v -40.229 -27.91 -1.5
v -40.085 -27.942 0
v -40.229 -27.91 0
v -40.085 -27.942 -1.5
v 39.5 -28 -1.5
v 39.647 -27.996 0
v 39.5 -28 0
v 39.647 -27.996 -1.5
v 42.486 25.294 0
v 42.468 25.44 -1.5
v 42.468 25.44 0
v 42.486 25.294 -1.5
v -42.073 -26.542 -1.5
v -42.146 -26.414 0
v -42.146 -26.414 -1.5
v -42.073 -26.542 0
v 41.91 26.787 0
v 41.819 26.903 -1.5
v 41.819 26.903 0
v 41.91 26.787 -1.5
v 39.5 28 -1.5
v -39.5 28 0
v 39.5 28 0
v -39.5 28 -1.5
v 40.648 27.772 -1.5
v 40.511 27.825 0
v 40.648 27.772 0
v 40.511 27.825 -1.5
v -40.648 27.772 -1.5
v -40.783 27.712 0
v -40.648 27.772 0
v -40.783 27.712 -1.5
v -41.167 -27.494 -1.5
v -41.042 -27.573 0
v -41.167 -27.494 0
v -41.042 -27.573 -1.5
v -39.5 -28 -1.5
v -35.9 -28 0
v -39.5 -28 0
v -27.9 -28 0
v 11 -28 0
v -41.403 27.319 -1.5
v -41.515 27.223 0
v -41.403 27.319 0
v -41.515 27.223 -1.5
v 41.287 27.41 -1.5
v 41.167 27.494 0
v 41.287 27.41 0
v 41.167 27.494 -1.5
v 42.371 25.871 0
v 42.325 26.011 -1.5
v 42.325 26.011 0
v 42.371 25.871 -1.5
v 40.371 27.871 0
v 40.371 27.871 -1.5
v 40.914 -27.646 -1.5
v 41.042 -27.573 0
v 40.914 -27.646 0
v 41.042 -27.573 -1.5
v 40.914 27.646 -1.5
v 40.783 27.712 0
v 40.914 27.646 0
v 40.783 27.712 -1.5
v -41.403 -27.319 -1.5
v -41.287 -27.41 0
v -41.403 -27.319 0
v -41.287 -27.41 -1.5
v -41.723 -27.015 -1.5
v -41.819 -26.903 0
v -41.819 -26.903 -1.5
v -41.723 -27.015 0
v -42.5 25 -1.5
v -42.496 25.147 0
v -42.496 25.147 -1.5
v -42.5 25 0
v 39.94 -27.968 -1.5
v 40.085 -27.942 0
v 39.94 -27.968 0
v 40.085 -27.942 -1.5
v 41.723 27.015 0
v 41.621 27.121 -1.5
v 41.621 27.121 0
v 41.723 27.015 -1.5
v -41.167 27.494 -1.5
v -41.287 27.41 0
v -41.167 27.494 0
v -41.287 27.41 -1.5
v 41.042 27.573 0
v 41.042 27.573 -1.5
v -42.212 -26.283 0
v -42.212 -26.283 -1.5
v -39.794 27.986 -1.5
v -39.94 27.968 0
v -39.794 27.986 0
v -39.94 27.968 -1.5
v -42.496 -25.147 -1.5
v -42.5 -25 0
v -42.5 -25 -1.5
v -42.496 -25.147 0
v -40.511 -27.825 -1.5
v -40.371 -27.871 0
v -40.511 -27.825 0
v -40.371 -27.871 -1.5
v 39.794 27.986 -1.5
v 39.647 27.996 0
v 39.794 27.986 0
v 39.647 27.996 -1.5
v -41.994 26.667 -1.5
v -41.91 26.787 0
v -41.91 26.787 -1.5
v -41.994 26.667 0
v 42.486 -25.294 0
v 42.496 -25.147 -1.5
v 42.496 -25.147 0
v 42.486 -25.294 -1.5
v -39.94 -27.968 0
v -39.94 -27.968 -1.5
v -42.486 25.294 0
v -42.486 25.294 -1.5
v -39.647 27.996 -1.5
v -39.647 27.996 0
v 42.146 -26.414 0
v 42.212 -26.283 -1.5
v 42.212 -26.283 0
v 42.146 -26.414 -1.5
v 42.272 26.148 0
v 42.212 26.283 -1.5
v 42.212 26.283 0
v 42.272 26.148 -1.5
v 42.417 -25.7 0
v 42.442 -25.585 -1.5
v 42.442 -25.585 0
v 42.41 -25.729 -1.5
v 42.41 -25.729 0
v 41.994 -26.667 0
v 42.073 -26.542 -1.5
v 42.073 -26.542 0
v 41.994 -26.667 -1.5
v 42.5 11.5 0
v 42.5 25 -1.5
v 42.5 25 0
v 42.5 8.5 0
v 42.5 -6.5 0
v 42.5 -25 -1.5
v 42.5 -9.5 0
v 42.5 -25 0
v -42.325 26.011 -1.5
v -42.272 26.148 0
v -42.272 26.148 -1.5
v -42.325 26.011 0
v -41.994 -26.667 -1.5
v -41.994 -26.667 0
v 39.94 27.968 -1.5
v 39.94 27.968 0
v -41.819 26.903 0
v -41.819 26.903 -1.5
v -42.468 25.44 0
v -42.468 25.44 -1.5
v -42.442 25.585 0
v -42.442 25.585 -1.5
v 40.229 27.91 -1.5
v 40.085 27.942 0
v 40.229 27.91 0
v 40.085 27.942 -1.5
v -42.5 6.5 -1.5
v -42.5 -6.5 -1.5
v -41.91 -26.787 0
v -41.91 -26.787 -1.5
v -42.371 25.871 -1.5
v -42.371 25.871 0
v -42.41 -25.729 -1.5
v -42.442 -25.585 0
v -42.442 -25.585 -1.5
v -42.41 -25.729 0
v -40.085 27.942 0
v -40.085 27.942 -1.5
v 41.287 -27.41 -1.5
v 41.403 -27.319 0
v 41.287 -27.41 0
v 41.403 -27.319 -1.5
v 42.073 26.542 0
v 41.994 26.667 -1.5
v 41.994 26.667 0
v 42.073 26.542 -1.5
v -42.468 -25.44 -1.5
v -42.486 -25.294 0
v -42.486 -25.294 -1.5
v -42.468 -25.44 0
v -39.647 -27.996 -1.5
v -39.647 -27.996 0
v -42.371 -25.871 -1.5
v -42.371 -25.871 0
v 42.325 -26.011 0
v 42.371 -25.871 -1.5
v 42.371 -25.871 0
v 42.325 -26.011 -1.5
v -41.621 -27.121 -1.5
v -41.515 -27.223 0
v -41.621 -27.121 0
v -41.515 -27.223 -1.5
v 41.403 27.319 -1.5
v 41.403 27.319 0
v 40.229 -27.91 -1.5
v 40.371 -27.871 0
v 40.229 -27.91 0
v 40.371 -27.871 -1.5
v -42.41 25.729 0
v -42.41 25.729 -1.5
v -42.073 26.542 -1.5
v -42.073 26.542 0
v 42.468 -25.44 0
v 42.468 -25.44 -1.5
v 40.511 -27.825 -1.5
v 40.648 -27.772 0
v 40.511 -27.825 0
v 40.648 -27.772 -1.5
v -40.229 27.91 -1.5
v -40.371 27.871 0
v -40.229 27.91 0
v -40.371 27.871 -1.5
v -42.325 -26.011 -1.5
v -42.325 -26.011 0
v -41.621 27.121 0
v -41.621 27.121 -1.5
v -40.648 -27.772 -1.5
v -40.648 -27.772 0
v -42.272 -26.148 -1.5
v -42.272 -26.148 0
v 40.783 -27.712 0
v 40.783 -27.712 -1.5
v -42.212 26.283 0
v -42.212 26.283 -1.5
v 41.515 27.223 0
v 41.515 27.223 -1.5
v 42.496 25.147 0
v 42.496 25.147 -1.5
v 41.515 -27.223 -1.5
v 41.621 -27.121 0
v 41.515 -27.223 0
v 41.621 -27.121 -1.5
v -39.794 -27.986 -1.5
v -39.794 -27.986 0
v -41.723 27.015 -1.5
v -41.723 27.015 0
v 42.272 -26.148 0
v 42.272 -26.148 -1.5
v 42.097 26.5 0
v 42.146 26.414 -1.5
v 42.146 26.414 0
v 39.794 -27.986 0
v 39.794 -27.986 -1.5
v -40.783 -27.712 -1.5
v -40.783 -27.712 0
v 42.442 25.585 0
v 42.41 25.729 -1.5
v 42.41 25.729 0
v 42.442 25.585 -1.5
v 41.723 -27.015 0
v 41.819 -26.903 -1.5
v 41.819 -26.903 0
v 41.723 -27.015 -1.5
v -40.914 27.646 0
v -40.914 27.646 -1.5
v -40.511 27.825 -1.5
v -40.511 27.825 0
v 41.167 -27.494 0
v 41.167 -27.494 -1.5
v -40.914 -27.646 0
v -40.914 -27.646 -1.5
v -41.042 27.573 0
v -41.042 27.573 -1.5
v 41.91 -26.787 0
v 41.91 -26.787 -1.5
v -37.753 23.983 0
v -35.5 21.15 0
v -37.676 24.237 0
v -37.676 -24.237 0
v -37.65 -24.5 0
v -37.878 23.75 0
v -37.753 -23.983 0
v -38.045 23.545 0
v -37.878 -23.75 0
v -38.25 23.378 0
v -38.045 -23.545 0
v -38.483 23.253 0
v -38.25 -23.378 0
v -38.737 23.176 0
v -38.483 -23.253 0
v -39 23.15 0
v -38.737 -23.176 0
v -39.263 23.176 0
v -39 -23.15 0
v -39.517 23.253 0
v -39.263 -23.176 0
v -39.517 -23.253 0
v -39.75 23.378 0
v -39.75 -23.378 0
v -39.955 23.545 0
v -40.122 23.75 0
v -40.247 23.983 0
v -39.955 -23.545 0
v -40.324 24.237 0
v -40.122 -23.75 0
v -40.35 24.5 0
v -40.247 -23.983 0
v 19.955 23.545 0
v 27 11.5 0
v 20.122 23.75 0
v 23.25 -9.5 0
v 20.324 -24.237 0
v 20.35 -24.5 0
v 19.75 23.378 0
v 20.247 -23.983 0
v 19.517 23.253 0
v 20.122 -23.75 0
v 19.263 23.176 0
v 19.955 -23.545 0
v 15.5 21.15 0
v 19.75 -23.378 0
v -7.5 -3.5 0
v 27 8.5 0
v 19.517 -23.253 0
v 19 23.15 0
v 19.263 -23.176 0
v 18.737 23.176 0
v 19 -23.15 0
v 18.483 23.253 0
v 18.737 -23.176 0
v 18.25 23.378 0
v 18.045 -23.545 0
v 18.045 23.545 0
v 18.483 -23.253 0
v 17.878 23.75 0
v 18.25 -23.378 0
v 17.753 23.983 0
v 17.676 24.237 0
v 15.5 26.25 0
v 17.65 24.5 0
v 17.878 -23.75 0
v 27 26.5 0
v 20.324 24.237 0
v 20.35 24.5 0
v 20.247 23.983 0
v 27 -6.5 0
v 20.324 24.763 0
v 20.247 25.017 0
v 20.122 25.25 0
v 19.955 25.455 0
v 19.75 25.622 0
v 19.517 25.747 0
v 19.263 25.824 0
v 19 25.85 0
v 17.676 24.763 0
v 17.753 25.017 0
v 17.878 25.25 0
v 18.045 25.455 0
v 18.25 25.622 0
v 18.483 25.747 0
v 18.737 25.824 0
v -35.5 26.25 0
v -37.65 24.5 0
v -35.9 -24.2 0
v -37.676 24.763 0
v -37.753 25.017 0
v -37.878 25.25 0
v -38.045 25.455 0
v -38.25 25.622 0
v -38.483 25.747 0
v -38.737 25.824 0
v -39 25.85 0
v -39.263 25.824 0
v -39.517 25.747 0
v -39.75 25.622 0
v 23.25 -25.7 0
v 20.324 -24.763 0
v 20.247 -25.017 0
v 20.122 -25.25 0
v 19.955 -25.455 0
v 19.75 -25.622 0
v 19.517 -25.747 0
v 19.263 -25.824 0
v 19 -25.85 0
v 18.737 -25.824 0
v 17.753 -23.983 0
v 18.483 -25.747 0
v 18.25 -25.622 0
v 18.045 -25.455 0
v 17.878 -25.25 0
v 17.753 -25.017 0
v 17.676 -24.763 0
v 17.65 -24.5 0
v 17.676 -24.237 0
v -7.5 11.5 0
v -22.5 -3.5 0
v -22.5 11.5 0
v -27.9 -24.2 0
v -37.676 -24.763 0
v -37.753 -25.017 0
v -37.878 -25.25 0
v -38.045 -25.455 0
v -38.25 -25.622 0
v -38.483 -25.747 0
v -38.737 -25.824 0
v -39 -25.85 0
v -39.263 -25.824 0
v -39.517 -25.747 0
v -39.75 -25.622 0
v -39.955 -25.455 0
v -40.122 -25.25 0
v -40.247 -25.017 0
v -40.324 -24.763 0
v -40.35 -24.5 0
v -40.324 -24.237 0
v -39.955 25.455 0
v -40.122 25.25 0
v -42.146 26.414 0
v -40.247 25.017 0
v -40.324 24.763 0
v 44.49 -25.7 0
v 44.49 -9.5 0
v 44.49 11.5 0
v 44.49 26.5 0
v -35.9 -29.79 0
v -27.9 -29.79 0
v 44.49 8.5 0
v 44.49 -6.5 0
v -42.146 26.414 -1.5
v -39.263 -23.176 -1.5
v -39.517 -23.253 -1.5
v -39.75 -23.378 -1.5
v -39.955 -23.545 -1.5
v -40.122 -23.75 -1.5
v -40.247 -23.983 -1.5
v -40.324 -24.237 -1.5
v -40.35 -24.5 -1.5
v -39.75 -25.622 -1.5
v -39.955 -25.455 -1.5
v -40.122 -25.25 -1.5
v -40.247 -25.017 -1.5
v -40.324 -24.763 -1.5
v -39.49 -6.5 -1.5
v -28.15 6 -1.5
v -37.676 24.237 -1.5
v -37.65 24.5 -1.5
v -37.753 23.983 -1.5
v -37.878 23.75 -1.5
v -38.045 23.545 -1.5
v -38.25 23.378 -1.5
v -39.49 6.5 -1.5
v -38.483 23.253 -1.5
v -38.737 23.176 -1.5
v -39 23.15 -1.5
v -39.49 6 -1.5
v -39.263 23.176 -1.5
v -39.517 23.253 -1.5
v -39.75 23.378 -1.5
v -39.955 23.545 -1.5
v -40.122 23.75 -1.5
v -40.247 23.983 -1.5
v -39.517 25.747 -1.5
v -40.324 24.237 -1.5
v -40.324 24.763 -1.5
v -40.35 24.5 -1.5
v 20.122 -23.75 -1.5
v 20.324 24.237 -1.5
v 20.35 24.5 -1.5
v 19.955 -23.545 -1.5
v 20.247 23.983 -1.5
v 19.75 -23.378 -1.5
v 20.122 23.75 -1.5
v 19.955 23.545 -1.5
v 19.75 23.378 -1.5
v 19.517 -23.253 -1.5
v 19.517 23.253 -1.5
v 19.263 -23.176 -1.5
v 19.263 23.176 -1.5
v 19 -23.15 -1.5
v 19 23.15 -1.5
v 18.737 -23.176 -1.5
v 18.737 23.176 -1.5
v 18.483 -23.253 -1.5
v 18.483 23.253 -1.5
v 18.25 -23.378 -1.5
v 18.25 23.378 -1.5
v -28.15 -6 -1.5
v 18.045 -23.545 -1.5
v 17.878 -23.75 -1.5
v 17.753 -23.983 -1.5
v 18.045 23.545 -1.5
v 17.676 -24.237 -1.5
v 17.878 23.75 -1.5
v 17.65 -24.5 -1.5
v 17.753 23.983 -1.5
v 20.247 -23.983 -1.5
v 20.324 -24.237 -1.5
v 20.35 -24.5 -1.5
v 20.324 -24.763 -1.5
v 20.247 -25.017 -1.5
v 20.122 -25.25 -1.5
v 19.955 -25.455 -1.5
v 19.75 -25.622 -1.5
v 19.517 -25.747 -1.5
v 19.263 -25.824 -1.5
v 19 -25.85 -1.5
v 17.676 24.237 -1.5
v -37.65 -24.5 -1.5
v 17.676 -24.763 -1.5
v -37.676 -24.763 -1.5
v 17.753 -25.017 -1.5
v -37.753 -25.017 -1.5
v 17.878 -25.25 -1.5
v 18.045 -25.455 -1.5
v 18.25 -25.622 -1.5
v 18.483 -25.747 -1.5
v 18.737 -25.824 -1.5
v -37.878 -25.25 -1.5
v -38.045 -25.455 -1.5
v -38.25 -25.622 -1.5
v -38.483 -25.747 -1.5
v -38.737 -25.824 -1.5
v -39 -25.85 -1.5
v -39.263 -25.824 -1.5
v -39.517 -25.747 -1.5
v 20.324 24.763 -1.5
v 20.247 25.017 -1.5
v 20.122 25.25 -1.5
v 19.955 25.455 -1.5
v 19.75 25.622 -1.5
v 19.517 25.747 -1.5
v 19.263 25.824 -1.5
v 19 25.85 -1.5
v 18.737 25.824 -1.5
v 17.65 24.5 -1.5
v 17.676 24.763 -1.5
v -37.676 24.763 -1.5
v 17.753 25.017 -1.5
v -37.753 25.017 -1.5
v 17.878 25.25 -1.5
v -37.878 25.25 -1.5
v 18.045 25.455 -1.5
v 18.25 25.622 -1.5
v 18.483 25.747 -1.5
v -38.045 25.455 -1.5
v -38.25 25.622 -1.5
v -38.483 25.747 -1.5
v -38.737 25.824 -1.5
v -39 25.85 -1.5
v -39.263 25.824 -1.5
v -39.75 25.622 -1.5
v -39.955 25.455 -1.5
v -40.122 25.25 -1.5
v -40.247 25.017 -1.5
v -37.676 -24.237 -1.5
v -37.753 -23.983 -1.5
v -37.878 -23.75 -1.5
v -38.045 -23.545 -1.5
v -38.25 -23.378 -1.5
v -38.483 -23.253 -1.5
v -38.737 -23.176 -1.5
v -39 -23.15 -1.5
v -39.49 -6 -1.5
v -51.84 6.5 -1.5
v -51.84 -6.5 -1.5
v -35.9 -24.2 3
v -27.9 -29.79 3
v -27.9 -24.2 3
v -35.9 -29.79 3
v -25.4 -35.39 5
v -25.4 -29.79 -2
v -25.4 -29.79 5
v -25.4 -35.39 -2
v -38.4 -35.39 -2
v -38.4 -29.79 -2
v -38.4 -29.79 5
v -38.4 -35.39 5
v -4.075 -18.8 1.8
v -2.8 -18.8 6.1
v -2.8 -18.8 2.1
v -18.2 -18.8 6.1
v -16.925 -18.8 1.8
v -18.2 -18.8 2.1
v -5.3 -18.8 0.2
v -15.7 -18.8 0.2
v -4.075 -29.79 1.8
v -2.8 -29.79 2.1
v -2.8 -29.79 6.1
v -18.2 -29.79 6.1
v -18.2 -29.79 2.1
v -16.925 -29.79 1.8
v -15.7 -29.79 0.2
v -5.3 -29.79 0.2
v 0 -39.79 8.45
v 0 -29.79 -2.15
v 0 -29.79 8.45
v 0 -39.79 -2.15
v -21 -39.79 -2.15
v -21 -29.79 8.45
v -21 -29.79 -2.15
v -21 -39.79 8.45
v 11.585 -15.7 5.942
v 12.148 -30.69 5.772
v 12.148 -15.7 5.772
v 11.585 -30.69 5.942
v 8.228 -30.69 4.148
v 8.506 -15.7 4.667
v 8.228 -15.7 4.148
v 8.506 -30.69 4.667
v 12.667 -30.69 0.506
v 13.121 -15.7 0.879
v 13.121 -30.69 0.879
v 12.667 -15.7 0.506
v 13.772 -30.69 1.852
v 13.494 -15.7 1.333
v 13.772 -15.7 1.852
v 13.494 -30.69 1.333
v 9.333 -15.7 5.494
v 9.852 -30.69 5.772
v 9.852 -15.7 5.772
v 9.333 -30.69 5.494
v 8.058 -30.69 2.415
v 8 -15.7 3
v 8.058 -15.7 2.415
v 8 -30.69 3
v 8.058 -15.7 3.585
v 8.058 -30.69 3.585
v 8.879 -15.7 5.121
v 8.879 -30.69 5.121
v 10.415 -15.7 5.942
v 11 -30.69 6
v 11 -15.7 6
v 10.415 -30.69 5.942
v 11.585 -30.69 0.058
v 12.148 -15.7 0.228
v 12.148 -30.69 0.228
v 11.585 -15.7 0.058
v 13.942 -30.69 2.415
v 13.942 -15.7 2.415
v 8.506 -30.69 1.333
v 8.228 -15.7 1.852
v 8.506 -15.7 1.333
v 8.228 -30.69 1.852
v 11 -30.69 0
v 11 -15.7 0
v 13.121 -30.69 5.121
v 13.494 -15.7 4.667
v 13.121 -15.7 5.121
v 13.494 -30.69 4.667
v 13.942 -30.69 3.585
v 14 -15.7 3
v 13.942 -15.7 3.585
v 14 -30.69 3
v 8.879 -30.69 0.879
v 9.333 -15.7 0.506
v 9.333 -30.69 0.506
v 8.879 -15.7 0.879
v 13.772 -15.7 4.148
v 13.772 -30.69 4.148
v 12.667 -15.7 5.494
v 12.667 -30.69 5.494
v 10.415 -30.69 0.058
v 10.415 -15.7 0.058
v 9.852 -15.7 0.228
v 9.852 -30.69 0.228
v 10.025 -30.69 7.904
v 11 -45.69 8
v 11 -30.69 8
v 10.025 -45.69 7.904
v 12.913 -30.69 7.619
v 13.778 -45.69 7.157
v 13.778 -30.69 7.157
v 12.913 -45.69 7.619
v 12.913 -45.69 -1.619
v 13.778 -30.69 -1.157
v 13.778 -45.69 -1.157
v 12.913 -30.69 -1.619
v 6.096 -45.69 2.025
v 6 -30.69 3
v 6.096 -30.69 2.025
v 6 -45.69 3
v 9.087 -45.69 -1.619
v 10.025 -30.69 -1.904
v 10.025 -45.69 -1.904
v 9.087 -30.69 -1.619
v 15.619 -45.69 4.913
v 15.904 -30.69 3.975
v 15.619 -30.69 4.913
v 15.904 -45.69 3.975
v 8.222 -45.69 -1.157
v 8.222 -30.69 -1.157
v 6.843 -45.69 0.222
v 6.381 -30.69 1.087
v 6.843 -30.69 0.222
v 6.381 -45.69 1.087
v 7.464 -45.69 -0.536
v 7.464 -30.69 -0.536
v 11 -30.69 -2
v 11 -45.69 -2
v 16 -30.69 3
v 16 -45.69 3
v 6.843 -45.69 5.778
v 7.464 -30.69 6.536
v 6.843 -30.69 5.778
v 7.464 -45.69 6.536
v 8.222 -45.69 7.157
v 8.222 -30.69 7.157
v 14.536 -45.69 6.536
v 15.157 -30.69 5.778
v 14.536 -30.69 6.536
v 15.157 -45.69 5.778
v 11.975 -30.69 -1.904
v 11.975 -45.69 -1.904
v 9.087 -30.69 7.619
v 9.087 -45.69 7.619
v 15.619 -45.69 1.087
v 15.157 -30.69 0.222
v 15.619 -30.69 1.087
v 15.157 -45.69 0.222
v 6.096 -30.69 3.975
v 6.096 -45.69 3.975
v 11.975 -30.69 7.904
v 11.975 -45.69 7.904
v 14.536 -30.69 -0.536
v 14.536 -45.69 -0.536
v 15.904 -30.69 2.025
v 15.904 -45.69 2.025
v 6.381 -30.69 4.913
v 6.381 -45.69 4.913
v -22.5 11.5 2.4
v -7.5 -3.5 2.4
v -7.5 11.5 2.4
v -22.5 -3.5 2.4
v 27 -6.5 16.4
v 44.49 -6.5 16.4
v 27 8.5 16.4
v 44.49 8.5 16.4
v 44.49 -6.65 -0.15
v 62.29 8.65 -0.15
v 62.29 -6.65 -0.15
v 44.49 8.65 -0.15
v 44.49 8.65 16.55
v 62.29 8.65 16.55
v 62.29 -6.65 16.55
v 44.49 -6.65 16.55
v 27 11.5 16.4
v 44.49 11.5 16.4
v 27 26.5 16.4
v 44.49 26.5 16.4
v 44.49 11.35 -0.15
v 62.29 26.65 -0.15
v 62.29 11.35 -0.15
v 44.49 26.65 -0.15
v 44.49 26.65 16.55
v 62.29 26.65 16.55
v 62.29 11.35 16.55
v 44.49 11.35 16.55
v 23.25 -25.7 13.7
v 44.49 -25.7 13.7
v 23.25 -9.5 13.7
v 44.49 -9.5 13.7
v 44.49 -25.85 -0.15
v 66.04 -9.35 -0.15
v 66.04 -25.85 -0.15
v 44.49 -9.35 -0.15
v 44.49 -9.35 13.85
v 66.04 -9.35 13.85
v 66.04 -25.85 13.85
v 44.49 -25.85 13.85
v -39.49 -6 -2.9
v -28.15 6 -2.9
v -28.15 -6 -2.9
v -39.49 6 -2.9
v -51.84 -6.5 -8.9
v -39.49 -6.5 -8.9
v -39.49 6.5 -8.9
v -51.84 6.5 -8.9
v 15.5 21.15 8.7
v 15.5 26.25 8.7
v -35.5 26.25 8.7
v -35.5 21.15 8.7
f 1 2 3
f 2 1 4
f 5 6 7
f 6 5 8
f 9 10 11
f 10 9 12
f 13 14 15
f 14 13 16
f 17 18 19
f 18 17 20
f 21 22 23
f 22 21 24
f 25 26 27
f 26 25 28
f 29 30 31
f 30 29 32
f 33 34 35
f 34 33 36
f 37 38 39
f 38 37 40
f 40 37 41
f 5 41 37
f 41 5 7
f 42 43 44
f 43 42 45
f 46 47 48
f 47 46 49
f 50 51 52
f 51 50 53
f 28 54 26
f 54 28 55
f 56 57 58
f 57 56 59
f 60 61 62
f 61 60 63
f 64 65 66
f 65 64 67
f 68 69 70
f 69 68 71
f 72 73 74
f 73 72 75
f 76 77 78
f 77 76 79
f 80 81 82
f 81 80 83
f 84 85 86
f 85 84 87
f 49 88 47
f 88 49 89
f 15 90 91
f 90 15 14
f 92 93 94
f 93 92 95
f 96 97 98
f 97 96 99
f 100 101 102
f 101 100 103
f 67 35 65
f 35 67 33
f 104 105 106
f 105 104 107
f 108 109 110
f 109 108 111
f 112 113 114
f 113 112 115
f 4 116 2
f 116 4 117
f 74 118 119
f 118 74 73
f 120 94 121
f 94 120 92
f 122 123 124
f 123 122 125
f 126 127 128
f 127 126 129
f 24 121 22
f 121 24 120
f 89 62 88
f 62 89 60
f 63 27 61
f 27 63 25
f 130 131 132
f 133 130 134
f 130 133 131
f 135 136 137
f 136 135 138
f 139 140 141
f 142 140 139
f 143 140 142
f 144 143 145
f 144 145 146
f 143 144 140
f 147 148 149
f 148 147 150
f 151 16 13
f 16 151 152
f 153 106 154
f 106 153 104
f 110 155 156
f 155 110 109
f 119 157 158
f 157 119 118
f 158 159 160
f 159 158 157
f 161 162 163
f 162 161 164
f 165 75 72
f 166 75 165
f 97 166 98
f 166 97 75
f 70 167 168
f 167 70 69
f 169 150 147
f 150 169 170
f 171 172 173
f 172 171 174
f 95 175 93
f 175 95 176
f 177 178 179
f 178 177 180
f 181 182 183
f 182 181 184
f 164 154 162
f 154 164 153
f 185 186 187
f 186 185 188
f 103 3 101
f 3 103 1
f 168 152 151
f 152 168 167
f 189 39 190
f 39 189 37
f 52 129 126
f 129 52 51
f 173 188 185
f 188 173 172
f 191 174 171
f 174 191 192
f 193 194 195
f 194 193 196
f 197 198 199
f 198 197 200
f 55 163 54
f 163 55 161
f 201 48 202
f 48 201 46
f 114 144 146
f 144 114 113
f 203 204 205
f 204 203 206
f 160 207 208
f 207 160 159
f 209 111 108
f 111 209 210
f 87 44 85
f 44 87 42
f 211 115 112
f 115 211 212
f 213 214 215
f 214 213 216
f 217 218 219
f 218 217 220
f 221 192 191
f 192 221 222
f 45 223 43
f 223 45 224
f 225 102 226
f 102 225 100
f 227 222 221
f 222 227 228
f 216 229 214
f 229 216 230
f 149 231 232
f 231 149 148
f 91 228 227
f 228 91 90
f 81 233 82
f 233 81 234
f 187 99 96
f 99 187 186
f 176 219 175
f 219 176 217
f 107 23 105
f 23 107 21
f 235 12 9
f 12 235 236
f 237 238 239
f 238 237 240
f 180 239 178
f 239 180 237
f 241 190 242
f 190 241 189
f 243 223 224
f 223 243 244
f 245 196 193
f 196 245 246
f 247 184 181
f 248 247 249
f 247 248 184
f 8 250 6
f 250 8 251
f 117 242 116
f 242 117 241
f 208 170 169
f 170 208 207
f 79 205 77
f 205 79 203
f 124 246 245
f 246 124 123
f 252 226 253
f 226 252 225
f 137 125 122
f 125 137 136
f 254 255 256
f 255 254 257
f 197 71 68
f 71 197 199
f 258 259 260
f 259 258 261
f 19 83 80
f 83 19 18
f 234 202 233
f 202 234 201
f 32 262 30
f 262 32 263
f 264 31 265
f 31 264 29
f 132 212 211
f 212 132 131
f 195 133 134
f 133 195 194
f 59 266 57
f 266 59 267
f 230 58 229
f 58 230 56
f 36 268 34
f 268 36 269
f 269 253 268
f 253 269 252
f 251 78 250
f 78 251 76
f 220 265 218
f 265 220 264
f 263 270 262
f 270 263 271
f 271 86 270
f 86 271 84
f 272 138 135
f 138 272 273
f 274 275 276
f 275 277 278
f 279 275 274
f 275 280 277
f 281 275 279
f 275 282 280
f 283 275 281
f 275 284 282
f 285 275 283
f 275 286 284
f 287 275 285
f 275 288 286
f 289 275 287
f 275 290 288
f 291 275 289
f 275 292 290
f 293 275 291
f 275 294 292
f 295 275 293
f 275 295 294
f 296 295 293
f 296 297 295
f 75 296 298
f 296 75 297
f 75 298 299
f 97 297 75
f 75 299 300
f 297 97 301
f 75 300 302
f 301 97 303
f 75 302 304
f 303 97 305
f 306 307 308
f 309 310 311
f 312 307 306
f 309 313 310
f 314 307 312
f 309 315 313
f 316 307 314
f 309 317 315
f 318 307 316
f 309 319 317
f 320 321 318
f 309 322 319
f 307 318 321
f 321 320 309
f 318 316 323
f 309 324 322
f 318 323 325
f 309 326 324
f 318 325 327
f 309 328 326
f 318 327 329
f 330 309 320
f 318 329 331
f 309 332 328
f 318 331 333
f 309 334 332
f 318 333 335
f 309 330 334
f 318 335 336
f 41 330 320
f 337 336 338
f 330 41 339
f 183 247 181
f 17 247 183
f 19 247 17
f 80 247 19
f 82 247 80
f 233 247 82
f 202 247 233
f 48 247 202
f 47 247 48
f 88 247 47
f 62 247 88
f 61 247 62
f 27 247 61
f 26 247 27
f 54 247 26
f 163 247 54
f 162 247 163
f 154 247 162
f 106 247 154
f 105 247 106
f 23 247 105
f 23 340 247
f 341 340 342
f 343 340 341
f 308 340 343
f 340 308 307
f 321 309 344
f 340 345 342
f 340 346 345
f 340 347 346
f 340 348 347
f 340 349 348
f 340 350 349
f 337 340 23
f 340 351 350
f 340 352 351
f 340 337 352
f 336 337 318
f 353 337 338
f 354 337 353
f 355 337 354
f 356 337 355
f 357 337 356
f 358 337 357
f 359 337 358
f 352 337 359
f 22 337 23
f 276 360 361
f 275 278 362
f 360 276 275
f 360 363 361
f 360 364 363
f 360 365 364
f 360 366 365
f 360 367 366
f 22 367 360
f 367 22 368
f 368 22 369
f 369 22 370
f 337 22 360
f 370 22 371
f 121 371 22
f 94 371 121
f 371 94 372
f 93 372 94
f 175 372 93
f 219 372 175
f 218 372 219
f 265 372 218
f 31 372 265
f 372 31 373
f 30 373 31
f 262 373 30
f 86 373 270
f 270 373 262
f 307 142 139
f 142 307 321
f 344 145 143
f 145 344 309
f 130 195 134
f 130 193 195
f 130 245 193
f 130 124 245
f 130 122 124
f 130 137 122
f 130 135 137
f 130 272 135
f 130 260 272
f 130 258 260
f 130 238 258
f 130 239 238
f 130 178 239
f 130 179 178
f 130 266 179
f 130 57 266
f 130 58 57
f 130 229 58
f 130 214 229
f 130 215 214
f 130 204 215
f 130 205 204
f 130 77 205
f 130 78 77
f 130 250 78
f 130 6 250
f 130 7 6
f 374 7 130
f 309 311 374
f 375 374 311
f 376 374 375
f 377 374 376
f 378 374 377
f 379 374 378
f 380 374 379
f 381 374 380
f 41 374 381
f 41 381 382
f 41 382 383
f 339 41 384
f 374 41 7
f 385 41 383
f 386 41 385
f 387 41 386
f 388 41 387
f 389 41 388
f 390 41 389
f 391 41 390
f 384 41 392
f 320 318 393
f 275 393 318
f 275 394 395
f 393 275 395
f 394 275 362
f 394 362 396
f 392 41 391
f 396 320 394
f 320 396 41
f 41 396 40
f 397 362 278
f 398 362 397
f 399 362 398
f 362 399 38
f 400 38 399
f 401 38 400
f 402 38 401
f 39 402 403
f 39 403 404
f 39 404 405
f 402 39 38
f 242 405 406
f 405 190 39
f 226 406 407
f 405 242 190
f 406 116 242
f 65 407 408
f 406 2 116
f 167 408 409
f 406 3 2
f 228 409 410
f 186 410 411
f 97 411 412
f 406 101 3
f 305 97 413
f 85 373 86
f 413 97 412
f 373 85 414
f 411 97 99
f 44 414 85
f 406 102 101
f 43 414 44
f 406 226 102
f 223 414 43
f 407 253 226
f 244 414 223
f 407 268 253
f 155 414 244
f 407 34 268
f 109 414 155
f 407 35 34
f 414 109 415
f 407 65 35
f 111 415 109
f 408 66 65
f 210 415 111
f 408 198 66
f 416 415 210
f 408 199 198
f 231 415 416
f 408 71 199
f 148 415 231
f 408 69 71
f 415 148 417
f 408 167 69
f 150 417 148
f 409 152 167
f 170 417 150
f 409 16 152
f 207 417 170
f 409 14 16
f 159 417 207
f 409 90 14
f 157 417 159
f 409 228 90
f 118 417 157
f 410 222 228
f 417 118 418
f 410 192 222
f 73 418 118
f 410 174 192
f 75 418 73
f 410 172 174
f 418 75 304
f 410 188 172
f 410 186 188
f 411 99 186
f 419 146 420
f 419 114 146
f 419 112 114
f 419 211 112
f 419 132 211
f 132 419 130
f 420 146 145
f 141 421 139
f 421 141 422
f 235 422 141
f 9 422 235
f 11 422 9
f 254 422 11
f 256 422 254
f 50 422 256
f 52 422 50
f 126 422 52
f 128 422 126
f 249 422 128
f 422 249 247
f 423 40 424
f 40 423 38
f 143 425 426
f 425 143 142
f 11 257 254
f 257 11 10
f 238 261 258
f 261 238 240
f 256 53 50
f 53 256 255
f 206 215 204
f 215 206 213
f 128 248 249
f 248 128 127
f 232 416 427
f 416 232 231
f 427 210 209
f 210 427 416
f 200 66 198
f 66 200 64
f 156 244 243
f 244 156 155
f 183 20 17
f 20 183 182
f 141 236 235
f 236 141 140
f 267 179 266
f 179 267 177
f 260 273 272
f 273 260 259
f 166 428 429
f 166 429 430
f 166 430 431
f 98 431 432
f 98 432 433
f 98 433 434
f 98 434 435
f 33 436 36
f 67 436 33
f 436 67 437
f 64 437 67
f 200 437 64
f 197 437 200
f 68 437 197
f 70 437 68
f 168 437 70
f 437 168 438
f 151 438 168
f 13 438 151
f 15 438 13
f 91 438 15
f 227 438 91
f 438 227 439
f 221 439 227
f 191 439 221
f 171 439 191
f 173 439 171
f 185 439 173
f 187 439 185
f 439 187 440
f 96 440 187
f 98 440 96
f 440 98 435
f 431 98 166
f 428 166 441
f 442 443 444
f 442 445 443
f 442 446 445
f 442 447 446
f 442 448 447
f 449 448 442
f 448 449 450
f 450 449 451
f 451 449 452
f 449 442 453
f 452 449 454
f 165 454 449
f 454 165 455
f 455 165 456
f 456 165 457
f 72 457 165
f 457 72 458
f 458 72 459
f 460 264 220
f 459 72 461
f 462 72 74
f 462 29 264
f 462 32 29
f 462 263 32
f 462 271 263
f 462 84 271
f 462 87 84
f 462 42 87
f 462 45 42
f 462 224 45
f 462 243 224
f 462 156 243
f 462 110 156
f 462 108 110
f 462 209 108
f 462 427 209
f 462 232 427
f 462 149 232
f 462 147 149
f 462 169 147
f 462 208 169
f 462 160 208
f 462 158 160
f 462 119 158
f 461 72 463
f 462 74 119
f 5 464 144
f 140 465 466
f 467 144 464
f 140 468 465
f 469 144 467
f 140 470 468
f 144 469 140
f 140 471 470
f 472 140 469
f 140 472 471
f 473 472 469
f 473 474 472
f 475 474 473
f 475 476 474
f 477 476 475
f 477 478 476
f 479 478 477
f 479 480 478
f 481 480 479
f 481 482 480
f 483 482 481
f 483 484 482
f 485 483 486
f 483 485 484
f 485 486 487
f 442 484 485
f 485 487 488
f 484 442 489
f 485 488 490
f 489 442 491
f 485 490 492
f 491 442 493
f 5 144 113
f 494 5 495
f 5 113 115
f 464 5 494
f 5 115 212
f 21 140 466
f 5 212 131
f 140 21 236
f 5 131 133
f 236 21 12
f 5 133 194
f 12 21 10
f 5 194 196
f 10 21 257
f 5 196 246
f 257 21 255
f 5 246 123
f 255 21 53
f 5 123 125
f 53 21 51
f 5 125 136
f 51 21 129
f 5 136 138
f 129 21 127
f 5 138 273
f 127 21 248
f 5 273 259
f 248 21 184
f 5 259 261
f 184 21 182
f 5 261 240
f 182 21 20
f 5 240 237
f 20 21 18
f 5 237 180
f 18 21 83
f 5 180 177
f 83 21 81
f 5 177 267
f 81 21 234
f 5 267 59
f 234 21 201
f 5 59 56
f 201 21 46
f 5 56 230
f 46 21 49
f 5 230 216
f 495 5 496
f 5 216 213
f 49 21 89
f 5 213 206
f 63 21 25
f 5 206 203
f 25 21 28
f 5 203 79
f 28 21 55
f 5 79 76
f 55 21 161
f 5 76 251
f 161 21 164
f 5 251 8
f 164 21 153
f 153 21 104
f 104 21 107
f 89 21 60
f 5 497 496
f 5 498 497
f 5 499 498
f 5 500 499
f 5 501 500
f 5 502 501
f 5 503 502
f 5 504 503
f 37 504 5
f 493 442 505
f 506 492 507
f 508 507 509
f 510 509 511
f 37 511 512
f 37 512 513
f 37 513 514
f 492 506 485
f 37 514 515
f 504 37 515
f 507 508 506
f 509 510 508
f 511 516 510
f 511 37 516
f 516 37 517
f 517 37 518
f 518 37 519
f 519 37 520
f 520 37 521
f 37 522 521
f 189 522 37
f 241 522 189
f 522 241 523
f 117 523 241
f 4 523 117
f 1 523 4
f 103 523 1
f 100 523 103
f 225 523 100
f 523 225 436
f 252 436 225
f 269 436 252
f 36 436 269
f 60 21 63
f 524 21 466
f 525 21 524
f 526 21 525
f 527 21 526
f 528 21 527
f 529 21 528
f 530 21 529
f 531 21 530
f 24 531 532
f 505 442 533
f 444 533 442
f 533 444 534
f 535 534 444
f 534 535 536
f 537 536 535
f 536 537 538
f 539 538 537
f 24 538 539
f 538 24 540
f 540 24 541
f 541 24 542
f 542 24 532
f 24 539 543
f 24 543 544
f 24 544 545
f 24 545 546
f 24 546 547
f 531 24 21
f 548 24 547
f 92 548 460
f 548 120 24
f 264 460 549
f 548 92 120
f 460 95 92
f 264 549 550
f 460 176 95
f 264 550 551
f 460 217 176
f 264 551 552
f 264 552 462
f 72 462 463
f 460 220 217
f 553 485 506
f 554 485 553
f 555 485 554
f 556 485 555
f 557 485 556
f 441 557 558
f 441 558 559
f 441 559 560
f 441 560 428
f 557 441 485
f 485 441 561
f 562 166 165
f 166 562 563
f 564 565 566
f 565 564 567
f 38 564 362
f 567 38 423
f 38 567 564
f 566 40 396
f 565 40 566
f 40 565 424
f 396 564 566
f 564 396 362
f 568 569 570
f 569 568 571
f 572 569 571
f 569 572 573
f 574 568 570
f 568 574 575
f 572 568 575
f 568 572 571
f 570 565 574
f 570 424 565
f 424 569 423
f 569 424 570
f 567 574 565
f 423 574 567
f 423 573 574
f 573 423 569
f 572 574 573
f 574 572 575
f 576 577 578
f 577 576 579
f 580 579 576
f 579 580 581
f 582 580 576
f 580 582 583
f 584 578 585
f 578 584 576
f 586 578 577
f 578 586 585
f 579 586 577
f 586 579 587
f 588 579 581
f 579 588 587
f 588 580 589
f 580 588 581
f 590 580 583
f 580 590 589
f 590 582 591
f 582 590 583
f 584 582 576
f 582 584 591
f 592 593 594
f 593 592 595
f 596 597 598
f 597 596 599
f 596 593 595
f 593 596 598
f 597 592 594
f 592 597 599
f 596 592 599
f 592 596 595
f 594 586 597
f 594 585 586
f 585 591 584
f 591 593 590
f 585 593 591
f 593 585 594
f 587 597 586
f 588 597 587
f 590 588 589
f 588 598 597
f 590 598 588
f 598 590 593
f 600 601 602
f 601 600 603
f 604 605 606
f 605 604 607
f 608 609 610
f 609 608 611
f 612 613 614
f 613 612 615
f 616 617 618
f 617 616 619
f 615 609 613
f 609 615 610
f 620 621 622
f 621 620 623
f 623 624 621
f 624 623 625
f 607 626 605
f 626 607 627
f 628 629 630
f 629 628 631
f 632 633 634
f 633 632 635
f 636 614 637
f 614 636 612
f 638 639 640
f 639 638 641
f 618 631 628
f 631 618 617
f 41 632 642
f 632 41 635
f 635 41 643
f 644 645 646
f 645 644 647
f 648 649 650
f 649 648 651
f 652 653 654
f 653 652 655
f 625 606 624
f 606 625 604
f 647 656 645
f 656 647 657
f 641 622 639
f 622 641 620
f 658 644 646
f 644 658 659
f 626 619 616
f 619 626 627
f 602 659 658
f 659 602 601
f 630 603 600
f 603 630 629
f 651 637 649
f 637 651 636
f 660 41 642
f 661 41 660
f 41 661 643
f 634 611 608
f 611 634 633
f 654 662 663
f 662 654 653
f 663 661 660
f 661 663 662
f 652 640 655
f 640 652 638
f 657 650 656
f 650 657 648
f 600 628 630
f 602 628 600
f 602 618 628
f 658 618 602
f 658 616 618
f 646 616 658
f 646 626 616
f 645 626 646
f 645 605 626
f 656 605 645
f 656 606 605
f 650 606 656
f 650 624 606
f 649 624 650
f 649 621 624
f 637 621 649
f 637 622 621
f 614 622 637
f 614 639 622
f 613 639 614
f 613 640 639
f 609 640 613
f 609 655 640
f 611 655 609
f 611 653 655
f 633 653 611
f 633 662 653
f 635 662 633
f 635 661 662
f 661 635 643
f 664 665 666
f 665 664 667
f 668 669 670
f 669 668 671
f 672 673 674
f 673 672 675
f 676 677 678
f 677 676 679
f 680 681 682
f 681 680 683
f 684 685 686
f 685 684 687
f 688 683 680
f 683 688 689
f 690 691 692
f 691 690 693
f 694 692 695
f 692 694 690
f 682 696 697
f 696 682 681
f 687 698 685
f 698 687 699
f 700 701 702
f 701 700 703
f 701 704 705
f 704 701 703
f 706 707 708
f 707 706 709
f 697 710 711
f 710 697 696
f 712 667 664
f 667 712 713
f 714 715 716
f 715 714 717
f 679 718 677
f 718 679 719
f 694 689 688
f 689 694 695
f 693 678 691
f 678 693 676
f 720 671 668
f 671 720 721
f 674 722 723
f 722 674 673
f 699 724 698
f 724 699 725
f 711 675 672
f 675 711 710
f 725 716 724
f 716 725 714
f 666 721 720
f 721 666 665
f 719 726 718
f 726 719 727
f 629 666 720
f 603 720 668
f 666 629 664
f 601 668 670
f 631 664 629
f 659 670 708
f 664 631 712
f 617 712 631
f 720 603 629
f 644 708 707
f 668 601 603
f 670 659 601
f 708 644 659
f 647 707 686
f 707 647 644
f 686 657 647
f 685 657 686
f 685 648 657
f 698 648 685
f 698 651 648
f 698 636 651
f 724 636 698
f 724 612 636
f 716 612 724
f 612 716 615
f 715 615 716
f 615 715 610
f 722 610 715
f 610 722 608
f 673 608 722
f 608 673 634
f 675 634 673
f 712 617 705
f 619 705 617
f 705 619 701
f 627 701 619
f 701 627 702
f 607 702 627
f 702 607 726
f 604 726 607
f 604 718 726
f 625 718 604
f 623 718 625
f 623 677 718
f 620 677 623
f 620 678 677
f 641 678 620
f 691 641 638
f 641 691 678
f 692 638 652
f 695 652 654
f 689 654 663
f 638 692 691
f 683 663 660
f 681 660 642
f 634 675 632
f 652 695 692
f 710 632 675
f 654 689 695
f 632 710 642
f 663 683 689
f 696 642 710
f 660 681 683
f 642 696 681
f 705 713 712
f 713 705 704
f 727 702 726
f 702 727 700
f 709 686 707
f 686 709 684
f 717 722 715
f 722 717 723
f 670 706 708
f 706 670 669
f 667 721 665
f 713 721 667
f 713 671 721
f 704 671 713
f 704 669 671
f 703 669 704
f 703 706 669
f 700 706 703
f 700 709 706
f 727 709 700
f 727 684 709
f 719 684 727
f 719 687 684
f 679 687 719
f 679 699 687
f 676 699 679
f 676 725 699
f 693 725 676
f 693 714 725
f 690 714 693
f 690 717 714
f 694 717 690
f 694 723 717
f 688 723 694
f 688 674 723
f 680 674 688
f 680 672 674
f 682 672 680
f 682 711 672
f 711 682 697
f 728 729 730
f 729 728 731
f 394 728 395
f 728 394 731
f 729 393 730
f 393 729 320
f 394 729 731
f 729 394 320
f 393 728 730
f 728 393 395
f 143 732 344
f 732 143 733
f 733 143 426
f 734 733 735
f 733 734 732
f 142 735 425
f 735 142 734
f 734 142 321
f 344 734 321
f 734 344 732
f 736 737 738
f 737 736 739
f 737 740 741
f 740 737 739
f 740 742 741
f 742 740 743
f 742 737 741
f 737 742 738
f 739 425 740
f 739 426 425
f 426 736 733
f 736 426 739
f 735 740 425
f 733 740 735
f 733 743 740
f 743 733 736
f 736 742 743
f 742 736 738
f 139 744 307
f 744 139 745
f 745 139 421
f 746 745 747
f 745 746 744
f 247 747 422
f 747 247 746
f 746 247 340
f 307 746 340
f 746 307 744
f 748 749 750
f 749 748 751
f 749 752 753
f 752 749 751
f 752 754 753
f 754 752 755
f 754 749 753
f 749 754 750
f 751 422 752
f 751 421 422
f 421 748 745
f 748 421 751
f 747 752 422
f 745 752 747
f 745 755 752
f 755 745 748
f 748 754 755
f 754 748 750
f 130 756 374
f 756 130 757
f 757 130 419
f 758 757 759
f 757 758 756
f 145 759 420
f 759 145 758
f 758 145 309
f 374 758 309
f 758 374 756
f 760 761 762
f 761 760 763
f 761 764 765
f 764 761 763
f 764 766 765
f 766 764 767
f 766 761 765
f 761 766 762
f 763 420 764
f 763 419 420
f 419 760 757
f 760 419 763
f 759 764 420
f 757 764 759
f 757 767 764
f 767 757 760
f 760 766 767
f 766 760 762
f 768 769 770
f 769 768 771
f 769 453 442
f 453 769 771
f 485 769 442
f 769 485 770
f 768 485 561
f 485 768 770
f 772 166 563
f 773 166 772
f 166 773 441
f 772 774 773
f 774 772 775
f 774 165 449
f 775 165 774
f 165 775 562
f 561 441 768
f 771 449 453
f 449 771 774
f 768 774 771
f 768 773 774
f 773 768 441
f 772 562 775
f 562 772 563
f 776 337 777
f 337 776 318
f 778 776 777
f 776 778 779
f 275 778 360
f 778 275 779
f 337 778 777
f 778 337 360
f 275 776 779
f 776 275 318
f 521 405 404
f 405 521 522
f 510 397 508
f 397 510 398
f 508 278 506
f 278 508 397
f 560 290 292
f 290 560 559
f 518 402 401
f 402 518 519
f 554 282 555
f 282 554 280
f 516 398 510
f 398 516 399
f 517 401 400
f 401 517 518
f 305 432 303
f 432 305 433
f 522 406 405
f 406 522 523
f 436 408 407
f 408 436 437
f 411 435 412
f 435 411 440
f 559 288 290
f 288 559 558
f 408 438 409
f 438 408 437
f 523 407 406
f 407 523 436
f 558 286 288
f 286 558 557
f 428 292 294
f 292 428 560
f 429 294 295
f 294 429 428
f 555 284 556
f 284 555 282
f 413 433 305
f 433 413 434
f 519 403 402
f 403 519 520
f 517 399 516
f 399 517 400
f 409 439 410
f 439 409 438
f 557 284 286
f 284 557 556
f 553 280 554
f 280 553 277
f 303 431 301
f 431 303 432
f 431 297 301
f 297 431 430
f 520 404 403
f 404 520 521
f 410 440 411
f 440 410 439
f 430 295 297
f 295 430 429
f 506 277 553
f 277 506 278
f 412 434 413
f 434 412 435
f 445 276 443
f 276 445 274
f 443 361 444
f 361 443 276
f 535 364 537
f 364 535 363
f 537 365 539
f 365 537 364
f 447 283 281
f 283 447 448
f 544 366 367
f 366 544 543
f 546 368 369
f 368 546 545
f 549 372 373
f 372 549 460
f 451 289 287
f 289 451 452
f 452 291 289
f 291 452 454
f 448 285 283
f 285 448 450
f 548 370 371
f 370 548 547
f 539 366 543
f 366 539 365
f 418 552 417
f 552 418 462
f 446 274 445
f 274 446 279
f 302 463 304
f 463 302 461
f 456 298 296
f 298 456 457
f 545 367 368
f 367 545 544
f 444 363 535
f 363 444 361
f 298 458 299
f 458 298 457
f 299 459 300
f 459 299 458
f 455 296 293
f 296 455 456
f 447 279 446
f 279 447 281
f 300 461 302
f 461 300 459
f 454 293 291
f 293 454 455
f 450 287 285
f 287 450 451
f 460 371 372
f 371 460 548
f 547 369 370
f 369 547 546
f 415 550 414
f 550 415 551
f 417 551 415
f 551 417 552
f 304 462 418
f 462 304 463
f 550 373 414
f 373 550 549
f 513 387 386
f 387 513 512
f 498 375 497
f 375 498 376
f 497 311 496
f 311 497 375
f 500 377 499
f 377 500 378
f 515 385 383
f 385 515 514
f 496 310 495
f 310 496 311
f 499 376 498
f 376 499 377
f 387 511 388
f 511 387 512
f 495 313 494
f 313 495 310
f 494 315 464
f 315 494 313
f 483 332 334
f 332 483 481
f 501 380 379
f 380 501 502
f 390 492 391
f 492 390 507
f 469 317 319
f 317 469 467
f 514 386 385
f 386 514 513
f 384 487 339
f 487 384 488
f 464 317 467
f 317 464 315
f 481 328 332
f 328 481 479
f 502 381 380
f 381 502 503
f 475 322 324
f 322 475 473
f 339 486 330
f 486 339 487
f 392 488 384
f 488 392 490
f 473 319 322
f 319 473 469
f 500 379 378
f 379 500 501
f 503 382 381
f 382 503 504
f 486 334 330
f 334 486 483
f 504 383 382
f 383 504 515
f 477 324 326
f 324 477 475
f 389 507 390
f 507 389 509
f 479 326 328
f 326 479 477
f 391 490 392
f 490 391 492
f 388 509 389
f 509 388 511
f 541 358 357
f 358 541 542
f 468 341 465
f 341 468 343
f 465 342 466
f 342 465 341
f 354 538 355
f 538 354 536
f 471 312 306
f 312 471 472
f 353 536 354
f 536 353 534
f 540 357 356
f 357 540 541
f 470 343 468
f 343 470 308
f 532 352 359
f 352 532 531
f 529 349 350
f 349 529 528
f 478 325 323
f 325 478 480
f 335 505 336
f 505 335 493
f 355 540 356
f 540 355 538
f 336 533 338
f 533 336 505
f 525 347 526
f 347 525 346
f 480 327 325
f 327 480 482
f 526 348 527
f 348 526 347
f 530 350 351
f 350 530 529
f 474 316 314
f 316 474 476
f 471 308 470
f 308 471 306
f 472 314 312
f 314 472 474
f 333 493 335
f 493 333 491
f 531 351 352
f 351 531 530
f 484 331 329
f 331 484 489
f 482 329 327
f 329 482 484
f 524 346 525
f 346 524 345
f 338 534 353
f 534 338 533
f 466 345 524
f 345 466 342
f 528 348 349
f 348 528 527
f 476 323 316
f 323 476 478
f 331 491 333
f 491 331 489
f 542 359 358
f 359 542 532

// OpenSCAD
// Start: lazy_union
default_5_default_5();
// End: lazy_union

// Modules.

// 'PartMaterial undef-default - default 5.0'
module default_5_default_5() {
  // 'None : _combine_solids_and_holes'
  union() {
    // '_combine_solids_and_holes'
    difference() {
      // 'default : _combine_solids_and_holes'
      union() {
        // 'board'
        multmatrix(m=[[1.0, 0.0, 0.0, 0.0], [0.0, 1.0, 0.0, 0.0], [0.0, 0.0, 1.0, -0.75], [0.0, 0.0, 0.0, 1.0]]) {
          // 'board : _combine_solids_and_holes'
          union() {
            // 'hull'
            multmatrix(m=[[1.0, 0.0, 0.0, -42.5], [0.0, 1.0, 0.0, -28.0], [0.0, 0.0, 1.0, -0.75], [0.0, 0.0, 0.0, 1.0]]) {
              // 'hull : _combine_solids_and_holes'
              union() {
                // 'hull'
                linear_extrude(height=1.5, twist=0.0, slices=4, scale=[1.0, 1.0]) {
                  polygon(points=[[3.0, 0.0], [82.0, 0.0], [82.14720302298225, 0.003613631384482119], [82.29405142098868, 0.014445819983408104], [82.44019142336609, 0.03247047010565529], [82.58527096604838, 0.05764415879030649], [82.7289405397098, 0.08990624041636508], [82.87085403176339, 0.1291789928033702], [83.01066956017667, 0.17536780445093392], [83.14805029709527, 0.228361402466136], [83.28266528029084, 0.2880321206296661], [83.414190210478, 0.35423620695493074], [83.54230823257967, 0.4268141699991794], [83.66671069905881, 0.50559116309236], [83.7870979134773, 0.5903774055580606], [83.90317985249094, 0.6809686399117845], [84.01467686454106, 0.7771466239351184], [84.12132034355965, 0.8786796564403532], [84.22285337606488, 0.9853231354589407], [84.31903136008822, 1.0968201475090595], [84.40962259444194, 1.2129020865226963], [84.49440883690764, 1.33328930094119], [84.57318583000082, 1.4576917674203314], [84.64576379304506, 1.5858097895220038], [84.71196787937033, 1.7173347197091513], [84.77163859753387, 1.8519497029047285], [84.82463219554907, 1.9893304398233378], [84.87082100719662, 2.129145968236611], [84.91009375958363, 2.271059460290207], [84.94235584120969, 2.414729033951614], [84.96752952989435, 2.5598085766339143], [84.98555418001659, 2.705948579011318], [84.99638636861552, 2.8527969770177455], [85.0, 2.9999999999999996], [85.0, 53.0], [84.99638636861552, 53.147203022982254], [84.98555418001659, 53.29405142098868], [84.96752952989435, 53.44019142336609], [84.94235584120969, 53.585270966048384], [84.91009375958363, 53.72894053970979], [84.87082100719662, 53.870854031763386], [84.82463219554906, 54.01066956017666], [84.77163859753387, 54.14805029709527], [84.71196787937033, 54.28266528029084], [84.64576379304506, 54.41419021047799], [84.57318583000081, 54.542308232579664], [84.49440883690764, 54.666710699058804], [84.40962259444193, 54.7870979134773], [84.3190313600882, 54.90317985249093], [84.22285337606488, 55.01467686454105], [84.12132034355965, 55.12132034355964], [84.01467686454106, 55.22285337606487], [83.90317985249094, 55.3190313600882], [83.7870979134773, 55.40962259444193], [83.66671069905881, 55.49440883690763], [83.54230823257966, 55.57318583000081], [83.414190210478, 55.645763793045056], [83.28266528029084, 55.71196787937032], [83.14805029709527, 55.77163859753385], [83.01066956017667, 55.82463219554905], [82.87085403176339, 55.87082100719662], [82.7289405397098, 55.910093759583624], [82.58527096604838, 55.94235584120968], [82.44019142336609, 55.96752952989433], [82.29405142098868, 55.98555418001658], [82.14720302298225, 55.996386368615504], [82.0, 55.999999999999986], [3.0, 56.0], [2.852796977017746, 55.99638636861552], [2.7059485790113182, 55.98555418001659], [2.5598085766339143, 55.96752952989434], [2.4147290339516143, 55.94235584120969], [2.271059460290207, 55.91009375958363], [2.129145968236611, 55.870821007196625], [1.9893304398233378, 55.824632195549064], [1.8519497029047285, 55.77163859753386], [1.717334719709152, 55.711967879370334], [1.5858097895220038, 55.64576379304506], [1.4576917674203314, 55.57318583000082], [1.3332893009411895, 55.49440883690764], [1.2129020865226958, 55.409622594441934], [1.096820147509059, 55.31903136008821], [0.9853231354589402, 55.222853376064876], [0.8786796564403523, 55.121320343559645], [0.777146623935117, 55.01467686454106], [0.6809686399117831, 54.903179852490936], [0.5903774055580588, 54.787097913477304], [0.5055911630923573, 54.66671069905881], [0.4268141699991759, 54.542308232579664], [0.3542362069549263, 54.41419021047799], [0.2880321206296612, 54.28266528029085], [0.22836140246613024, 54.14805029709527], [0.1753678044509277, 54.01066956017666], [0.1291789928033631, 53.870854031763386], [0.08990624041635709, 53.72894053970979], [0.05764415879029716, 53.585270966048384], [0.03247047010564508, 53.44019142336609], [0.014445819983396557, 53.29405142098868], [0.0036136313844692403, 53.147203022982254], [-1.4210854715202004e-14, 53.0], [0.0, 3.0], [0.003613631384483007, 2.852796977017747], [0.014445819983409436, 2.7059485790113182], [0.03247047010565707, 2.559808576633915], [0.05764415879030871, 2.414729033951615], [0.08990624041636819, 2.2710594602902088], [0.1291789928033733, 2.129145968236614], [0.17536780445093747, 1.9893304398233398], [0.22836140246613956, 1.851949702904731], [0.28803212062966965, 1.7173347197091546], [0.35423620695493474, 1.5858097895220071], [0.42681416999918387, 1.4576917674203353], [0.5055911630923635, 1.3332893009411941], [0.5903774055580651, 1.2129020865227003], [0.6809686399117885, 1.0968201475090642], [0.7771466239351228, 0.9853231354589447], [0.8786796564403572, 0.8786796564403576], [0.9853231354589438, 0.7771466239351232], [1.0968201475090622, 0.6809686399117902], [1.2129020865227007, 0.5903774055580646], [1.3332893009411935, 0.5055911630923644], [1.4576917674203347, 0.42681416999918387], [1.5858097895220065, 0.3542362069549352], [1.7173347197091526, 0.28803212062967054], [1.851949702904729, 0.22836140246614045], [1.9893304398233402, 0.17536780445093747], [2.129145968236613, 0.1291789928033733], [2.271059460290208, 0.08990624041636819], [2.414729033951614, 0.05764415879030915], [2.5598085766339156, 0.03247047010565707], [2.7059485790113187, 0.014445819983409436], [2.852796977017746, 0.003613631384483007]]);
                }
              }
            }
          }
        }
        // 'usbM'
        multmatrix(m=[[-1.0, 0.0, 0.0, -27.9], [0.0, -1.0, 0.0, -24.2], [0.0, 0.0, 1.0, 0.0], [0.0, 0.0, 0.0, 1.0]]) {
          // 'usbM'
          color(c=[0.0, 1.0, 0.5, 1.0]) {
            // 'usbM : _combine_solids_and_holes'
            union() {
              // 'usbM'
              cube(size=[8.0, 5.6, 3.0]);
            }
          }
        }
        // ('usbM', 'outer')
        multmatrix(m=[[-1.0, 0.0, 0.0, -25.4], [0.0, 1.0, 0.0, -35.38999999999999], [0.0, 0.0, -1.0, 5.0], [0.0, 0.0, 0.0, 1.0]]) {
          // "('usbM', 'outer') : _combine_solids_and_holes"
          union() {
            // ('usbM', 'outer')
            cube(size=[13.0, 5.6, 7.0]);
          }
        }
        // 'hdmi1'
        multmatrix(m=[[-1.0, 0.0, 0.0, -10.5], [0.0, -1.0, 0.0, -24.3], [0.0, 0.0, 1.0, 3.1500000000000004], [0.0, 0.0, 0.0, 1.0]]) {
          // 'hdmi1'
          color(c=[0.0, 1.0, 0.5, 1.0]) {
            // 'hdmi1 : _combine_solids_and_holes'
            union() {
              // 'hdmi'
              multmatrix(m=[[-1.0, 0.0, 0.0, 0.0], [0.0, 0.0, 1.0, -5.5], [0.0, 1.0, 0.0, -2.95], [0.0, 0.0, 0.0, 1.0]]) {
                // 'hdmi : _combine_solids_and_holes'
                union() {
                  // 'hdmi'
                  linear_extrude(height=11.0, twist=0.0, slices=4, scale=[1.0, 1.0]) {
                    polygon(points=[[0.0, 0.0], [-5.199999999999999, 0.0], [-6.425, 1.6000000000000005], [-7.7, 1.9000000000000004], [-7.7, 5.9], [7.7, 5.9], [7.7, 1.9000000000000004], [6.425, 1.6000000000000005], [5.199999999999999, 0.0]]);
                  }
                }
              }
            }
          }
        }
        // ('hdmi1', 'outer')
        multmatrix(m=[[-1.0, 0.0, 0.0, 0.0], [0.0, 1.0, 0.0, -39.79], [0.0, 0.0, -1.0, 8.45], [0.0, 0.0, 0.0, 1.0]]) {
          // "('hdmi1', 'outer') : _combine_solids_and_holes"
          union() {
            // ('hdmi1', 'outer')
            cube(size=[21.0, 10.0, 10.6]);
          }
        }
        // 'audio'
        multmatrix(m=[[-1.0, 0.0, 0.0, 11.0], [0.0, 0.0, 1.0, -30.7], [0.0, 1.0, 0.0, 3.0], [0.0, 0.0, 0.0, 1.0]]) {
          // 'audio'
          color(c=[0.0, 1.0, 0.5, 1.0]) {
            // 'audio : _combine_solids_and_holes'
            union() {
              // 'audio'
              cylinder(h=15.0, r1=3.0, r2=3.0, center=false, $fn=32);
            }
          }
        }
        // ('audio', 'outer')
        multmatrix(m=[[-1.0, 0.0, 0.0, 11.0], [0.0, 0.0, -1.0, -30.689999999999998], [0.0, -1.0, 0.0, 3.0], [0.0, 0.0, 0.0, 1.0]]) {
          // "('audio', 'outer') : _combine_solids_and_holes"
          union() {
            // ('audio', 'outer')
            cylinder(h=15.0, r1=5.0, r2=5.0, center=false, $fn=32);
          }
        }
        // 'cpu'
        multmatrix(m=[[-1.0, 0.0, 0.0, -7.5], [0.0, -1.0, 0.0, 11.5], [0.0, 0.0, 1.0, 0.0], [0.0, 0.0, 0.0, 1.0]]) {
          // 'cpu'
          color(c=[0.0, 1.0, 0.5, 1.0]) {
            // 'cpu : _combine_solids_and_holes'
            union() {
              // 'cpu'
              cube(size=[15.0, 15.0, 2.4]);
            }
          }
        }
        // 'usbA2'
        multmatrix(m=[[0.0, 1.0, 0.0, 27.0], [-1.0, 0.0, 0.0, 8.5], [0.0, 0.0, 1.0, 0.0], [0.0, 0.0, 0.0, 1.0]]) {
          // 'usbA2'
          color(c=[0.0, 1.0, 0.5, 1.0]) {
            // 'usbA2 : _combine_solids_and_holes'
            union() {
              // 'usbA2'
              cube(size=[15.0, 17.5, 16.4]);
            }
          }
        }
        // ('usbA2', 'outer')
        multmatrix(m=[[0.0, -1.0, 0.0, 62.290000000000006], [-1.0, 0.0, 0.0, 8.65], [0.0, 0.0, -1.0, 16.549999999999997], [0.0, 0.0, 0.0, 1.0]]) {
          // "('usbA2', 'outer') : _combine_solids_and_holes"
          union() {
            // ('usbA2', 'outer')
            cube(size=[15.3, 17.8, 16.7]);
          }
        }
        // 'usbA3'
        multmatrix(m=[[0.0, 1.0, 0.0, 27.0], [-1.0, 0.0, 0.0, 26.5], [0.0, 0.0, 1.0, 0.0], [0.0, 0.0, 0.0, 1.0]]) {
          // 'usbA3'
          color(c=[0.0, 1.0, 0.5, 1.0]) {
            // 'usbA3 : _combine_solids_and_holes'
            union() {
              // 'usbA3'
              cube(size=[15.0, 17.5, 16.4]);
            }
          }
        }
        // ('usbA3', 'outer')
        multmatrix(m=[[0.0, -1.0, 0.0, 62.290000000000006], [-1.0, 0.0, 0.0, 26.65], [0.0, 0.0, -1.0, 16.549999999999997], [0.0, 0.0, 0.0, 1.0]]) {
          // "('usbA3', 'outer') : _combine_solids_and_holes"
          union() {
            // ('usbA3', 'outer')
            cube(size=[15.3, 17.8, 16.7]);
          }
        }
        // 'rj45'
        multmatrix(m=[[0.0, 1.0, 0.0, 23.25], [-1.0, 0.0, 0.0, -9.500000000000002], [0.0, 0.0, 1.0, 0.0], [0.0, 0.0, 0.0, 1.0]]) {
          // 'rj45'
          color(c=[0.0, 1.0, 0.5, 1.0]) {
            // 'rj45 : _combine_solids_and_holes'
            union() {
              // 'rj45'
              cube(size=[16.2, 21.25, 13.7]);
            }
          }
        }
        // ('rj45', 'outer')
        multmatrix(m=[[0.0, -1.0, 0.0, 66.04], [-1.0, 0.0, 0.0, -9.350000000000001], [0.0, 0.0, -1.0, 13.85], [0.0, 0.0, 0.0, 1.0]]) {
          // "('rj45', 'outer') : _combine_solids_and_holes"
          union() {
            // ('rj45', 'outer')
            cube(size=[16.5, 21.55, 14.0]);
          }
        }
        // 'micro_sd'
        multmatrix(m=[[0.0, -1.0, 0.0, -28.15], [-1.0, 0.0, 0.0, 6.0], [0.0, 0.0, -1.0, -1.5], [0.0, 0.0, 0.0, 1.0]]) {
          // 'micro_sd'
          color(c=[0.0, 1.0, 0.5, 1.0]) {
            // 'micro_sd : _combine_solids_and_holes'
            union() {
              // 'micro_sd'
              cube(size=[12.0, 11.35, 1.4]);
            }
          }
        }
        // ('micro_sd', 'outer')
        multmatrix(m=[[0.0, 1.0, 0.0, -51.84], [-1.0, 0.0, 0.0, 6.5], [0.0, 0.0, 1.0, -8.9], [0.0, 0.0, 0.0, 1.0]]) {
          // "('micro_sd', 'outer') : _combine_solids_and_holes"
          union() {
            // ('micro_sd', 'outer')
            cube(size=[13.0, 12.35, 7.4]);
          }
        }
        // 'header100'
        multmatrix(m=[[1.0, 0.0, 0.0, -35.5], [0.0, 1.0, 0.0, 21.15], [0.0, 0.0, 1.0, 0.0], [0.0, 0.0, 0.0, 1.0]]) {
          // 'header100'
          color(c=[0.0, 1.0, 0.5, 1.0]) {
            // 'header100 : _combine_solids_and_holes'
            union() {
              // 'header100'
              cube(size=[51.0, 5.1, 8.7]);
            }
          }
        }
      }
      // 'default'
      multmatrix(m=[[1.0, 0.0, 0.0, -39.0], [0.0, -1.0, 0.0, -24.5], [0.0, 0.0, -1.0, 0.02], [0.0, 0.0, 0.0, 1.0]]) {
        // "('mount_hole', 0) : _combine_solids_and_holes"
        union() {
          // ('mount_hole', 0)
          cylinder(h=3.02, r1=1.35, r2=1.35, center=false, $fn=32);
        }
      }
      // 'default'
      multmatrix(m=[[1.0, 0.0, 0.0, -39.0], [0.0, -1.0, 0.0, 24.5], [0.0, 0.0, -1.0, 0.02], [0.0, 0.0, 0.0, 1.0]]) {
        // "('mount_hole', 1) : _combine_solids_and_holes"
        union() {
          // ('mount_hole', 1)
          cylinder(h=3.02, r1=1.35, r2=1.35, center=false, $fn=32);
        }
      }
      // 'default'
      multmatrix(m=[[1.0, 0.0, 0.0, 19.0], [0.0, -1.0, 0.0, -24.5], [0.0, 0.0, -1.0, 0.02], [0.0, 0.0, 0.0, 1.0]]) {
        // "('mount_hole', 2) : _combine_solids_and_holes"
        union() {
          // ('mount_hole', 2)
          cylinder(h=3.02, r1=1.35, r2=1.35, center=false, $fn=32);
        }
      }
      // 'default'
      multmatrix(m=[[1.0, 0.0, 0.0, 19.0], [0.0, -1.0, 0.0, 24.5], [0.0, 0.0, -1.0, 0.02], [0.0, 0.0, 0.0, 1.0]]) {
        // "('mount_hole', 3) : _combine_solids_and_holes"
        union() {
          // ('mount_hole', 3)
          cylinder(h=3.02, r1=1.35, r2=1.35, center=false, $fn=32);
        }
      }
    }
  }
} // end module default_5_default_5
